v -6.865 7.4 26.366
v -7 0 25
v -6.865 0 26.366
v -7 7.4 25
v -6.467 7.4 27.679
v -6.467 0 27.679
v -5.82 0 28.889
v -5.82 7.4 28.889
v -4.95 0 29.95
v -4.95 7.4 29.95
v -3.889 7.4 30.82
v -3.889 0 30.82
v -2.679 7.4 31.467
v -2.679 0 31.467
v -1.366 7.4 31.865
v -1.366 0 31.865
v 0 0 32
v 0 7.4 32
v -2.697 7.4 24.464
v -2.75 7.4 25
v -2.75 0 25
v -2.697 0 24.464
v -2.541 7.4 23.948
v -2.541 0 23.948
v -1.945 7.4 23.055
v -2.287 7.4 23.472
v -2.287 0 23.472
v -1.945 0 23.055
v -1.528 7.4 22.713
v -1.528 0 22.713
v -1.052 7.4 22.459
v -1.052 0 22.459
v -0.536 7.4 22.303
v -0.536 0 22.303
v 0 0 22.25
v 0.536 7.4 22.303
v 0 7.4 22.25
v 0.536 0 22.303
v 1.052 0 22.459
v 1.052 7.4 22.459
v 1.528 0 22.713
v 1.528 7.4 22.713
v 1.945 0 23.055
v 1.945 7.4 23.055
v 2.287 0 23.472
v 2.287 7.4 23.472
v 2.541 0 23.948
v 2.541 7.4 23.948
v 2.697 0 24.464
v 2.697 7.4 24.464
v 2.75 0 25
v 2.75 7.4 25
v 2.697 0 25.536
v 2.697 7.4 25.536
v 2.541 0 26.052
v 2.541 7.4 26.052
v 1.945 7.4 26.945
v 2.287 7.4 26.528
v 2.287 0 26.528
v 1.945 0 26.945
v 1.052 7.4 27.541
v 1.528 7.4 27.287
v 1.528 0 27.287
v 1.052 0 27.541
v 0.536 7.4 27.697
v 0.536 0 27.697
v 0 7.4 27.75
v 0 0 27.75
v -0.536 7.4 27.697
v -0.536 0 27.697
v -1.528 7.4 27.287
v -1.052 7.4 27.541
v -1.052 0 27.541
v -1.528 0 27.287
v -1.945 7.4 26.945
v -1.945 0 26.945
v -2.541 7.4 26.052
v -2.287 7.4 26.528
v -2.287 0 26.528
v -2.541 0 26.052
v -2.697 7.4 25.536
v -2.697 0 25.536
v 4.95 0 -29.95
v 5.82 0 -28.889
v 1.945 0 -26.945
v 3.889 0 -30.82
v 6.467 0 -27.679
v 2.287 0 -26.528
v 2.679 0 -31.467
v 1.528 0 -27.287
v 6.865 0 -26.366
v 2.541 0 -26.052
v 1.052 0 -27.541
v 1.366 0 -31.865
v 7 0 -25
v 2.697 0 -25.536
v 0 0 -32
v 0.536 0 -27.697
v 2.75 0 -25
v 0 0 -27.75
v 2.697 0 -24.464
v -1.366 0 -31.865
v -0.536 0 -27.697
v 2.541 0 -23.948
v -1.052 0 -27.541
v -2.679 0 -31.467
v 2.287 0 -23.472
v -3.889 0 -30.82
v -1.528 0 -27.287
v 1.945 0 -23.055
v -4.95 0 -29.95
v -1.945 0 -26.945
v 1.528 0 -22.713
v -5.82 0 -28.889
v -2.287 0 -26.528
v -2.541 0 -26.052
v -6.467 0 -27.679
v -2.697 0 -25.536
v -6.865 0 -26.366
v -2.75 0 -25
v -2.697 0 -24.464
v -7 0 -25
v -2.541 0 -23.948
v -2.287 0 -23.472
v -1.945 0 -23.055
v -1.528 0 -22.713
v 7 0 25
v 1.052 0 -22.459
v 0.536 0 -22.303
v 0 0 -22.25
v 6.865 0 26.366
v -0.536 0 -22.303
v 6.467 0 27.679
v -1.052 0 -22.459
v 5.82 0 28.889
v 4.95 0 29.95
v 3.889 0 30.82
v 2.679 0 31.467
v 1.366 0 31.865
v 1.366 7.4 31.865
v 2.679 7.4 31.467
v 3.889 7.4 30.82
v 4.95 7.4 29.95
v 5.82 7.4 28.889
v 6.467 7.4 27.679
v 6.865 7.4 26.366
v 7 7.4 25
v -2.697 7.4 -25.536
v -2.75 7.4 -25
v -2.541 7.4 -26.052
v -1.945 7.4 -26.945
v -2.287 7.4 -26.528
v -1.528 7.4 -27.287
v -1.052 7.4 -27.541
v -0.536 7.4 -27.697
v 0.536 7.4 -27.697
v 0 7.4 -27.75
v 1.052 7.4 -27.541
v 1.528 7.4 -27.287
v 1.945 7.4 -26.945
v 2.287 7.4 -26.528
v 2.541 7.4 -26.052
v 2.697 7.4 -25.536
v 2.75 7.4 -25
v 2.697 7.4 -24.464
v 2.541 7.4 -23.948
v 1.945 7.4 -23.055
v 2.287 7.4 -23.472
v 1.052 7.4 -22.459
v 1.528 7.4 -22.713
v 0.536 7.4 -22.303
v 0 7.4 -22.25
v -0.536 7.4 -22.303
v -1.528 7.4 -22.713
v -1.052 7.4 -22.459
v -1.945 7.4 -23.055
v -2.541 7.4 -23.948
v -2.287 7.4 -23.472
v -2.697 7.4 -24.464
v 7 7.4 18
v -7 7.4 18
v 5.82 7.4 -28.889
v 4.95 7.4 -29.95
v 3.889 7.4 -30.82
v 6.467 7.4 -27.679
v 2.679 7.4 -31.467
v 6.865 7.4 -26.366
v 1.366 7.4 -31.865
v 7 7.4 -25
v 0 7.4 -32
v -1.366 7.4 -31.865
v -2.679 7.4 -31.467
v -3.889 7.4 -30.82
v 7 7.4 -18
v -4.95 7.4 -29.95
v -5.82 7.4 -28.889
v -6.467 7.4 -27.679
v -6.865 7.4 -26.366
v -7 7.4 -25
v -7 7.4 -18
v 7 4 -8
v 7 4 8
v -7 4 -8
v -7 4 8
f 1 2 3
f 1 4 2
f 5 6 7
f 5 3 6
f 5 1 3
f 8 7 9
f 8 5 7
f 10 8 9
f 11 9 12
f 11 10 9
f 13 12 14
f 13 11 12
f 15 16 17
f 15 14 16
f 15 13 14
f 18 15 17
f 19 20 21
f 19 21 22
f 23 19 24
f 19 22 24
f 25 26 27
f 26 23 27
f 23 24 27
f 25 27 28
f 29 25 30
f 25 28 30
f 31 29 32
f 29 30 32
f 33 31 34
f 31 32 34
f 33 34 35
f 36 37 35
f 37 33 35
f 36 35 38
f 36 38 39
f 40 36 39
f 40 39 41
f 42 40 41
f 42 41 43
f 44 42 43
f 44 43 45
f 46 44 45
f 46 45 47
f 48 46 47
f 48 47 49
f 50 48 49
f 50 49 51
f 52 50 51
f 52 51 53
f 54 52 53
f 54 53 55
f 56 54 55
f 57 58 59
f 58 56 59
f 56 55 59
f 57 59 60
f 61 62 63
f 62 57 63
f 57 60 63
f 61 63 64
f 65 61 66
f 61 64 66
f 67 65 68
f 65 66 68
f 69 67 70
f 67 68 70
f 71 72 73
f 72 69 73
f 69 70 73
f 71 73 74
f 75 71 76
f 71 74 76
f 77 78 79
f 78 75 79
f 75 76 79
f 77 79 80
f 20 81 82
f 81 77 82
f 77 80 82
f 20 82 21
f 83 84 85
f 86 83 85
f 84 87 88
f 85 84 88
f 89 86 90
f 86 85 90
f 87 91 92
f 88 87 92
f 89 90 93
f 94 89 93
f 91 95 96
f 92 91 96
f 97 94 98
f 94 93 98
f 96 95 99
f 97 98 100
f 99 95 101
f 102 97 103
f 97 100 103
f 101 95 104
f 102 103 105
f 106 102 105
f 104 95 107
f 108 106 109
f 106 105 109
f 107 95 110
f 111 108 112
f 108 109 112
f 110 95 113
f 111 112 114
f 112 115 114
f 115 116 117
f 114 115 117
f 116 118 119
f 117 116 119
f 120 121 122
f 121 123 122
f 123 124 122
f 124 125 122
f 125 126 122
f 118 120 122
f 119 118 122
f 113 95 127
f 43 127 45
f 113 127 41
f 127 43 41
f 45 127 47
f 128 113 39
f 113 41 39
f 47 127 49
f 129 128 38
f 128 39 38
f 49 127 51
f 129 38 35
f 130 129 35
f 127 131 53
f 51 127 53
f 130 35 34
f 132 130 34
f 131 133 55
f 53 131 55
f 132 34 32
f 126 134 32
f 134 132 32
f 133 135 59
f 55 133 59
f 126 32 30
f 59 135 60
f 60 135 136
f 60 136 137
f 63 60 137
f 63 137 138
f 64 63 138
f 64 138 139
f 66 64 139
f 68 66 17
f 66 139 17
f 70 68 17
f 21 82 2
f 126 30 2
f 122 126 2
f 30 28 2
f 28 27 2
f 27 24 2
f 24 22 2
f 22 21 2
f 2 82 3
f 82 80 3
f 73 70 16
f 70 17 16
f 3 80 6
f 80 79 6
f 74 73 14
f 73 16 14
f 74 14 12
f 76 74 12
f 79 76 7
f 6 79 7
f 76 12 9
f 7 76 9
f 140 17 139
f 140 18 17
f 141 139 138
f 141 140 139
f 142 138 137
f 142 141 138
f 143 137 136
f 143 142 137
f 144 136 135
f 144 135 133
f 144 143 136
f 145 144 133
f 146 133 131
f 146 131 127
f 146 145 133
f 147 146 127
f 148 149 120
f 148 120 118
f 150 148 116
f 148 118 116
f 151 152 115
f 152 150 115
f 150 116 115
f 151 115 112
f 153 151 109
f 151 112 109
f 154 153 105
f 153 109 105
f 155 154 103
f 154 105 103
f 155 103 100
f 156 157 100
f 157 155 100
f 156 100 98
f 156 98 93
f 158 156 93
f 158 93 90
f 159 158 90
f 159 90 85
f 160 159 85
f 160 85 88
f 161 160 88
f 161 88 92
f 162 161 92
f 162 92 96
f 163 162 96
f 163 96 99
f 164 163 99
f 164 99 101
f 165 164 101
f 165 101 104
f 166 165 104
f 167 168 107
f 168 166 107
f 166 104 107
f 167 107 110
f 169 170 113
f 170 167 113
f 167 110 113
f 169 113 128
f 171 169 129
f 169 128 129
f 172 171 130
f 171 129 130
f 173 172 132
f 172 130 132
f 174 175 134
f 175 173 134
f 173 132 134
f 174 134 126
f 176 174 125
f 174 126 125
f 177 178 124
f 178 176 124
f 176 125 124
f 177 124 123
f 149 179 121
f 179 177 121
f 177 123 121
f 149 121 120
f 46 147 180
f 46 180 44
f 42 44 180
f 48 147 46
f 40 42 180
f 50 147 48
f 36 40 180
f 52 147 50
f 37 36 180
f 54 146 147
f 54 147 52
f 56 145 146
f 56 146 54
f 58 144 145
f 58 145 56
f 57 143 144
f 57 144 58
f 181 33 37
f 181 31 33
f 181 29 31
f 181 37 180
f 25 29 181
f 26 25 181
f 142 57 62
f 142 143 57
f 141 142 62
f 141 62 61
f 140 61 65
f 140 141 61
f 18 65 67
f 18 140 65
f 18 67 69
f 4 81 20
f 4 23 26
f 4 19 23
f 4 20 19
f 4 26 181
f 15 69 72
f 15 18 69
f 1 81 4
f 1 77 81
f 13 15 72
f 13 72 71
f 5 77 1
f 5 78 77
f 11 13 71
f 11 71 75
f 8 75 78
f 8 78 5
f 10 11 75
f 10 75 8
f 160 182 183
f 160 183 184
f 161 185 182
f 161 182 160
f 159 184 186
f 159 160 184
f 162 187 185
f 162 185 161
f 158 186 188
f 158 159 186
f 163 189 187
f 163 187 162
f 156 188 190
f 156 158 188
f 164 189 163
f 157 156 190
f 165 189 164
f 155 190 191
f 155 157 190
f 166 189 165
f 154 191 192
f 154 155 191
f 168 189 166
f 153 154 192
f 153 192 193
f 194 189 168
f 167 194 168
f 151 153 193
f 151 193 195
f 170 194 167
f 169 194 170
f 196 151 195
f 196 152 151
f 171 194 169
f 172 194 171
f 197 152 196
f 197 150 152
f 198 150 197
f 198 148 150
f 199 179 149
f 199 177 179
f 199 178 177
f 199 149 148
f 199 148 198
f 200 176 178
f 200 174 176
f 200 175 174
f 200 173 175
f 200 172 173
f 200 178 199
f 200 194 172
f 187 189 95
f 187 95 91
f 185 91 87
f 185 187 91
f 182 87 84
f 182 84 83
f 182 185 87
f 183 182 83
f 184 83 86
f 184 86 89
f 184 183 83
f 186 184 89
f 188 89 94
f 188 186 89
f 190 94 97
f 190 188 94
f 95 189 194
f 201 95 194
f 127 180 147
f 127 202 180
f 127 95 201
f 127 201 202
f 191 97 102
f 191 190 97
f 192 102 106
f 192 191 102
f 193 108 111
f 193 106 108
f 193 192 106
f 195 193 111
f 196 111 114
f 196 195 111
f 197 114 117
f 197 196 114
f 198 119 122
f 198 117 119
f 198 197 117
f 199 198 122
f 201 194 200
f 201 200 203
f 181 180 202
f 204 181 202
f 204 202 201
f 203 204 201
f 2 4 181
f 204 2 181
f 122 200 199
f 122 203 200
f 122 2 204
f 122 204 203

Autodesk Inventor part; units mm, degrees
ref_plane "YZ Plane" through (0, 0, 0) normal (1, 0, 0) x (0, 1, 0)
ref_plane "XZ Plane" through (0, 0, 0) normal (0, 1, 0) x (-1, 0, 0)
ref_plane "XY Plane" through (0, 0, 0) normal (0, 0, 1) x (1, 0, 0)
sketch "Sketch1" plane through (0, 0, 0) normal (0, 1, 0) x (-1, 0, 0)
  line L0 (-7, 32) -> (7, 32)
  line L1 (7, 32) -> (7, -32)
  line L2 (7, -32) -> (-7, -32)
  line L3 (-7, -32) -> (-7, 32)
  line L4 (-7, 32) -> (7, -32) construction
  line L5 (7, 32) -> (-7, -32) construction
  circle A0 centre (0, 25) radius 2.75
  circle A1 centre (0, -25) radius 2.75
  line L6 (0, 25) -> (0, 0) construction
  line L7 (0, 0) -> (0, -25) construction
  dimension "d0" = 5.5
  dimension "d1" = 50
  dimension "d3" = 7
  dimension "d4" = 7
extrude "Extrusion1" add sketch "Sketch1" along normal blind 7.4
sketch "Sketch2" plane through (7, 0, 32) normal (1, 0, 0) x (0, 0, -1)
  line L0 (64, 7.4) -> (0, 7.4) construction
  line L1 (14, 7.4) -> (24, 4)
  line L2 (24, 4) -> (32, 4)
  line L3 (32, 4) -> (32, 0) construction
  line L4 (50, 7.4) -> (40, 4)
  line L5 (40, 4) -> (32, 4)
  line L6 (14, 7.4) -> (50, 7.4)
  line L7 (0, 0) -> (64, 0) projected
  line L8 (4.25, 7.4) -> (9.75, 7.4) projected
  point P0 (7, 7.4)
  dimension "d7" = 4
  dimension "d8" = 7
  dimension "d9" = 10
extrude "Extrusion2" cut sketch "Sketch2" against normal through all
fillet "Fillet1" radius 7 4 edges at (7, 3.7, 32) (-7, 3.7, 32) (-7, 3.7, -32) (7, 3.7, -32)
properties part number "CH_01_0052_bracket_mount"
